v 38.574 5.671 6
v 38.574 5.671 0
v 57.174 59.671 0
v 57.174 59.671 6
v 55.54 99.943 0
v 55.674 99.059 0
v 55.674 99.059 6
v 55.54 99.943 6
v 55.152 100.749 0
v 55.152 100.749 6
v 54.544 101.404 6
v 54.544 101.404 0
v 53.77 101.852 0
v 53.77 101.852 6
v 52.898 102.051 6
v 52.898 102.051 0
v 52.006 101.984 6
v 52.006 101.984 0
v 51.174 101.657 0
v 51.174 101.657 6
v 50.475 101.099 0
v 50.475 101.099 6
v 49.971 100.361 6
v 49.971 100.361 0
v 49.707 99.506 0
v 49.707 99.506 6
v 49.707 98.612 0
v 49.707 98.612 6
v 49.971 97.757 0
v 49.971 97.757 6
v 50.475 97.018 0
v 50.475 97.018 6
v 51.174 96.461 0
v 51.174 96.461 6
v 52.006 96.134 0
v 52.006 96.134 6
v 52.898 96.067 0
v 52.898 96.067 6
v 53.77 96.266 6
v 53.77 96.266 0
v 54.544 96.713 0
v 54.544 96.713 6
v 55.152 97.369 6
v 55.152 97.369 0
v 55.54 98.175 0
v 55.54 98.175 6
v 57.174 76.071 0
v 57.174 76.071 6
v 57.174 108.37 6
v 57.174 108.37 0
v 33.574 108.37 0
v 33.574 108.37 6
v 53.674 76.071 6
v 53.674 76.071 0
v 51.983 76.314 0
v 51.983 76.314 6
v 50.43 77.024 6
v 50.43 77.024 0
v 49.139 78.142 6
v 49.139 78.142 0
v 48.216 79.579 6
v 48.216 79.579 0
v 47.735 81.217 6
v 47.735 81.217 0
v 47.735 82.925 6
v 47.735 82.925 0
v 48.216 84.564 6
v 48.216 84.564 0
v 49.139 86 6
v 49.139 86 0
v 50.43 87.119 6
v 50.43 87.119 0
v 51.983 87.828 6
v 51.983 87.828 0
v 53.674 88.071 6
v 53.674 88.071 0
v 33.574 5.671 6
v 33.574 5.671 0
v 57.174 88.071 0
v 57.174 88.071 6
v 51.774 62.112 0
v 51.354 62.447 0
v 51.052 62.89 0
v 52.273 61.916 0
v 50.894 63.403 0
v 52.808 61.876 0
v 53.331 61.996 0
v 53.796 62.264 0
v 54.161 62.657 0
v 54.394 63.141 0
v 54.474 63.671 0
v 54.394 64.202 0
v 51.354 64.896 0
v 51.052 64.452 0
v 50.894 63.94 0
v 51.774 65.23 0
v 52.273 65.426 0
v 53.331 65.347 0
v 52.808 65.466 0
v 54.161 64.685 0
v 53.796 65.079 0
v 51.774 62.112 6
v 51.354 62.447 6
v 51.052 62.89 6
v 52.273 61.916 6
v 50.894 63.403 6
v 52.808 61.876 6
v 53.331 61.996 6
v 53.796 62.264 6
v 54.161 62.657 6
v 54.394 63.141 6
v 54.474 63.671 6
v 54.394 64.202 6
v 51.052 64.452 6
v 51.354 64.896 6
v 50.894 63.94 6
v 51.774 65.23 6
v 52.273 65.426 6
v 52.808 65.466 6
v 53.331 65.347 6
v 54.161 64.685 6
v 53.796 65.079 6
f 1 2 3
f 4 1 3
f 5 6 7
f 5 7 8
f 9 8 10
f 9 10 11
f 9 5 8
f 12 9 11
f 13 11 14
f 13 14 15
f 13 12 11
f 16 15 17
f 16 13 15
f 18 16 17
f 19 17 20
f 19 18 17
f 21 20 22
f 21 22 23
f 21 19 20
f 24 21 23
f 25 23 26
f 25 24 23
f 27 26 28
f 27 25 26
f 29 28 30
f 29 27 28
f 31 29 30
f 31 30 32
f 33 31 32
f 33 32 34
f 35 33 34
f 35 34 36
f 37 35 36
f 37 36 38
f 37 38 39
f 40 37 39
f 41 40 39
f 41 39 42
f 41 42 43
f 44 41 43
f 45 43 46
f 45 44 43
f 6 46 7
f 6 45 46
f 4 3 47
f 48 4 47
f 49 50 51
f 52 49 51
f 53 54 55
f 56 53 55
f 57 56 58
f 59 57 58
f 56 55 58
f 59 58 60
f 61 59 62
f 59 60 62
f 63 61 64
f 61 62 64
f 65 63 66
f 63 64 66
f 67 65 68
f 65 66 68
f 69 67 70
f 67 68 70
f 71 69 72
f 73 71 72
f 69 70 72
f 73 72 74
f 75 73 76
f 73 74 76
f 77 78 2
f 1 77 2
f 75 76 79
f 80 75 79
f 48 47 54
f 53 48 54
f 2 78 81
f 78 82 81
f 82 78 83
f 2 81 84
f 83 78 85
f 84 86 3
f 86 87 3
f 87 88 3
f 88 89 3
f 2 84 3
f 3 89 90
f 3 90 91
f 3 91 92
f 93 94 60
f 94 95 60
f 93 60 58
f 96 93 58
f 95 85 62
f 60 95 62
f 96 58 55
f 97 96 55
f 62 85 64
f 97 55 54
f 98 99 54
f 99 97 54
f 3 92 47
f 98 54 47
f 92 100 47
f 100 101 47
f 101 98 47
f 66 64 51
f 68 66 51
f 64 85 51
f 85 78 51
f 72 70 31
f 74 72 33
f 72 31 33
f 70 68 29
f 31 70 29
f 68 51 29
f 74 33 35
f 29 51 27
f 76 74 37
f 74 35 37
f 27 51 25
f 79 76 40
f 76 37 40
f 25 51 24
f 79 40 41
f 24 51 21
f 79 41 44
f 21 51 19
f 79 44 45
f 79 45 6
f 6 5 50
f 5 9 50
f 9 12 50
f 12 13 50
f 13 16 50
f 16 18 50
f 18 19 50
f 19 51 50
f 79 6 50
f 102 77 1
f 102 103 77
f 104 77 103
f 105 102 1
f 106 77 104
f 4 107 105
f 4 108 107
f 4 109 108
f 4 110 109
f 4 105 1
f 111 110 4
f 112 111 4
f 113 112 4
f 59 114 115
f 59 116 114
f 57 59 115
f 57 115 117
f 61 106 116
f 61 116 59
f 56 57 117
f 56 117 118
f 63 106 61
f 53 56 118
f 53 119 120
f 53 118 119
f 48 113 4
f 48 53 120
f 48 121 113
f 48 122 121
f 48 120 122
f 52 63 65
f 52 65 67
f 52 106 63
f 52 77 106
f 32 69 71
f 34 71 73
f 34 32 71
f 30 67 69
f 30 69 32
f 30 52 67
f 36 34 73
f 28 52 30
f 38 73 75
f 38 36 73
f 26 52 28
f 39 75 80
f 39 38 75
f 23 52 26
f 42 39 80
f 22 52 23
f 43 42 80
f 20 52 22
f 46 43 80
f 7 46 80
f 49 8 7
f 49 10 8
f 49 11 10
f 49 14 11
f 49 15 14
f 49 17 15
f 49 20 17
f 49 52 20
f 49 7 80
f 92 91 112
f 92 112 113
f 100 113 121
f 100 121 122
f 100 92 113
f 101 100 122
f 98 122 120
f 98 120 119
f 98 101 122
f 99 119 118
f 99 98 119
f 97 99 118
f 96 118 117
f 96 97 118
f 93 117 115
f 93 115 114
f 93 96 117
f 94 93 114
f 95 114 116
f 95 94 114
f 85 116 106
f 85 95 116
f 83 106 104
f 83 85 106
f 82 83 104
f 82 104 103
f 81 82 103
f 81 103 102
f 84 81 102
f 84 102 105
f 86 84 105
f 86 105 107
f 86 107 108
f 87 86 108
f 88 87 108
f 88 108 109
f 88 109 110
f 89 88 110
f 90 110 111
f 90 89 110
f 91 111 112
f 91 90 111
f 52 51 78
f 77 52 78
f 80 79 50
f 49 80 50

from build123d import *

# Parameters (mm, degrees)
MODEL_R                  = 1.8
MODEL_R_2                = 3
RESSALTO_EXTRUS_O1_DEPTH = 6


with BuildPart() as part:
    # Model → Ressalto-extrusão1 (new body)
    with BuildSketch(Plane.XY):
        with BuildLine():
            Line((57.173673193, 108.36959926), (33.573673193, 108.36959926))
            Line((33.573673193, 108.36959926), (33.573673193, 5.671329379))
            Line((33.573673193, 5.671329379), (38.573673193, 5.671329379))
            Line((38.573673193, 5.671329379), (57.173673193, 59.671329379))
            Line((57.173673193, 59.671329379), (57.173673193, 76.071329379))
            Line((57.173673193, 76.071329379), (53.673673193, 76.071329379))
            ThreePointArc((53.673673193, 76.071329379), (47.673673193, 82.071329379), (53.673673193, 88.071329379))
            Line((53.673673193, 88.071329379), (57.173673193, 88.071329379))
            Line((57.173673193, 88.071329379), (57.173673193, 108.36959926))
        make_face()
        with Locations((52.673673193, 63.671329379)):
            Circle(MODEL_R, mode=Mode.SUBTRACT)
        with Locations((52.673673193, 99.058930778)):
            Circle(MODEL_R_2, mode=Mode.SUBTRACT)
    extrude(amount=RESSALTO_EXTRUS_O1_DEPTH)


solid = part.part
